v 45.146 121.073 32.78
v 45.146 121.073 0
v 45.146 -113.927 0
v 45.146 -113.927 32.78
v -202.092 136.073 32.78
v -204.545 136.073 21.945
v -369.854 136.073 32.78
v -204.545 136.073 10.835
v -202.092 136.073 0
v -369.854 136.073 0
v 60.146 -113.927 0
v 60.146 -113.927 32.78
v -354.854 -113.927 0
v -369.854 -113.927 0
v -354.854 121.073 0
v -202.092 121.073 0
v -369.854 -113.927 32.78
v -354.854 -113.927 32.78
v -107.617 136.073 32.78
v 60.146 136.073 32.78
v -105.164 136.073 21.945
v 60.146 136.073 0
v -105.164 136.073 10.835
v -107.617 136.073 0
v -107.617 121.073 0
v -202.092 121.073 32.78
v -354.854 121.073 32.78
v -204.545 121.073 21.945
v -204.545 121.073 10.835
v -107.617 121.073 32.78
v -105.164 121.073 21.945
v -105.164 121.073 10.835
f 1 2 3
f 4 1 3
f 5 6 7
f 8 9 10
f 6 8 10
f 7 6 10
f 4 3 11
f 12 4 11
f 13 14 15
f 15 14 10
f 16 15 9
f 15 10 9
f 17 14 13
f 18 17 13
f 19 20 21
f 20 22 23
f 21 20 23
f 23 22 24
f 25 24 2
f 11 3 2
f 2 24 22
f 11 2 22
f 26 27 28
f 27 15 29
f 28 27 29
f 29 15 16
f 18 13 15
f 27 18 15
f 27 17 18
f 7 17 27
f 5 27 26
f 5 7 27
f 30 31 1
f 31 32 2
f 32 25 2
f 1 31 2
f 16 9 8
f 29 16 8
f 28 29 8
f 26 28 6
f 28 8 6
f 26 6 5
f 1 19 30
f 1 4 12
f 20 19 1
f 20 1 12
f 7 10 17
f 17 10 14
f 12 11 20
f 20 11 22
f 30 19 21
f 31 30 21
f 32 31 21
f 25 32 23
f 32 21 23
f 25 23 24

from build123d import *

# Parameters (mm, degrees)
EXTRUDE_1_DEPTH     = 32.78
SKETCH_2_R          = 50
CUT_EXTRUDE_1_DEPTH = 15


with BuildPart() as part:
    # 草图1 → 凸台-拉伸1 (new body)
    with BuildSketch(Plane.XY):
        Polygon((-369.854368932, -113.927184466), (-354.854368932, -113.927184466), (-354.854368932, 121.072815534), (45.145631068, 121.072815534), (45.145631068, -113.927184466), (60.145631068, -113.927184466), (60.145631068, 136.072815534), (-369.854368932, 136.072815534), align=None)
    extrude(amount=EXTRUDE_1_DEPTH)

    # 草图2 → 切除-拉伸1 (cut)
    with BuildSketch(Plane(origin=(0, 136.072815534, 0), x_dir=(1, 0, 0), z_dir=(0, 1, 0))):
        with Locations((-154.854368932, -16.39)):
            Circle(SKETCH_2_R)
    extrude(amount=-CUT_EXTRUDE_1_DEPTH, mode=Mode.SUBTRACT)


with BuildPart() as cut_extrude_1_piece_1:
    # of the separate pieces the step leaves, piece 1, a body of its own (cut_extrude_1_pieces)
    add(part.part.solids().sort_by_distance((-369.854368932, -113.927184466, 0))[0])


with BuildPart() as cut_extrude_1_piece_2:
    # of the separate pieces the step leaves, piece 2, a body of its own (cut_extrude_1_pieces)
    add(part.part.solids().sort_by_distance((60.145631068, 136.072815534, 0))[0])


solid = Compound([cut_extrude_1_piece_1.part, cut_extrude_1_piece_2.part])
